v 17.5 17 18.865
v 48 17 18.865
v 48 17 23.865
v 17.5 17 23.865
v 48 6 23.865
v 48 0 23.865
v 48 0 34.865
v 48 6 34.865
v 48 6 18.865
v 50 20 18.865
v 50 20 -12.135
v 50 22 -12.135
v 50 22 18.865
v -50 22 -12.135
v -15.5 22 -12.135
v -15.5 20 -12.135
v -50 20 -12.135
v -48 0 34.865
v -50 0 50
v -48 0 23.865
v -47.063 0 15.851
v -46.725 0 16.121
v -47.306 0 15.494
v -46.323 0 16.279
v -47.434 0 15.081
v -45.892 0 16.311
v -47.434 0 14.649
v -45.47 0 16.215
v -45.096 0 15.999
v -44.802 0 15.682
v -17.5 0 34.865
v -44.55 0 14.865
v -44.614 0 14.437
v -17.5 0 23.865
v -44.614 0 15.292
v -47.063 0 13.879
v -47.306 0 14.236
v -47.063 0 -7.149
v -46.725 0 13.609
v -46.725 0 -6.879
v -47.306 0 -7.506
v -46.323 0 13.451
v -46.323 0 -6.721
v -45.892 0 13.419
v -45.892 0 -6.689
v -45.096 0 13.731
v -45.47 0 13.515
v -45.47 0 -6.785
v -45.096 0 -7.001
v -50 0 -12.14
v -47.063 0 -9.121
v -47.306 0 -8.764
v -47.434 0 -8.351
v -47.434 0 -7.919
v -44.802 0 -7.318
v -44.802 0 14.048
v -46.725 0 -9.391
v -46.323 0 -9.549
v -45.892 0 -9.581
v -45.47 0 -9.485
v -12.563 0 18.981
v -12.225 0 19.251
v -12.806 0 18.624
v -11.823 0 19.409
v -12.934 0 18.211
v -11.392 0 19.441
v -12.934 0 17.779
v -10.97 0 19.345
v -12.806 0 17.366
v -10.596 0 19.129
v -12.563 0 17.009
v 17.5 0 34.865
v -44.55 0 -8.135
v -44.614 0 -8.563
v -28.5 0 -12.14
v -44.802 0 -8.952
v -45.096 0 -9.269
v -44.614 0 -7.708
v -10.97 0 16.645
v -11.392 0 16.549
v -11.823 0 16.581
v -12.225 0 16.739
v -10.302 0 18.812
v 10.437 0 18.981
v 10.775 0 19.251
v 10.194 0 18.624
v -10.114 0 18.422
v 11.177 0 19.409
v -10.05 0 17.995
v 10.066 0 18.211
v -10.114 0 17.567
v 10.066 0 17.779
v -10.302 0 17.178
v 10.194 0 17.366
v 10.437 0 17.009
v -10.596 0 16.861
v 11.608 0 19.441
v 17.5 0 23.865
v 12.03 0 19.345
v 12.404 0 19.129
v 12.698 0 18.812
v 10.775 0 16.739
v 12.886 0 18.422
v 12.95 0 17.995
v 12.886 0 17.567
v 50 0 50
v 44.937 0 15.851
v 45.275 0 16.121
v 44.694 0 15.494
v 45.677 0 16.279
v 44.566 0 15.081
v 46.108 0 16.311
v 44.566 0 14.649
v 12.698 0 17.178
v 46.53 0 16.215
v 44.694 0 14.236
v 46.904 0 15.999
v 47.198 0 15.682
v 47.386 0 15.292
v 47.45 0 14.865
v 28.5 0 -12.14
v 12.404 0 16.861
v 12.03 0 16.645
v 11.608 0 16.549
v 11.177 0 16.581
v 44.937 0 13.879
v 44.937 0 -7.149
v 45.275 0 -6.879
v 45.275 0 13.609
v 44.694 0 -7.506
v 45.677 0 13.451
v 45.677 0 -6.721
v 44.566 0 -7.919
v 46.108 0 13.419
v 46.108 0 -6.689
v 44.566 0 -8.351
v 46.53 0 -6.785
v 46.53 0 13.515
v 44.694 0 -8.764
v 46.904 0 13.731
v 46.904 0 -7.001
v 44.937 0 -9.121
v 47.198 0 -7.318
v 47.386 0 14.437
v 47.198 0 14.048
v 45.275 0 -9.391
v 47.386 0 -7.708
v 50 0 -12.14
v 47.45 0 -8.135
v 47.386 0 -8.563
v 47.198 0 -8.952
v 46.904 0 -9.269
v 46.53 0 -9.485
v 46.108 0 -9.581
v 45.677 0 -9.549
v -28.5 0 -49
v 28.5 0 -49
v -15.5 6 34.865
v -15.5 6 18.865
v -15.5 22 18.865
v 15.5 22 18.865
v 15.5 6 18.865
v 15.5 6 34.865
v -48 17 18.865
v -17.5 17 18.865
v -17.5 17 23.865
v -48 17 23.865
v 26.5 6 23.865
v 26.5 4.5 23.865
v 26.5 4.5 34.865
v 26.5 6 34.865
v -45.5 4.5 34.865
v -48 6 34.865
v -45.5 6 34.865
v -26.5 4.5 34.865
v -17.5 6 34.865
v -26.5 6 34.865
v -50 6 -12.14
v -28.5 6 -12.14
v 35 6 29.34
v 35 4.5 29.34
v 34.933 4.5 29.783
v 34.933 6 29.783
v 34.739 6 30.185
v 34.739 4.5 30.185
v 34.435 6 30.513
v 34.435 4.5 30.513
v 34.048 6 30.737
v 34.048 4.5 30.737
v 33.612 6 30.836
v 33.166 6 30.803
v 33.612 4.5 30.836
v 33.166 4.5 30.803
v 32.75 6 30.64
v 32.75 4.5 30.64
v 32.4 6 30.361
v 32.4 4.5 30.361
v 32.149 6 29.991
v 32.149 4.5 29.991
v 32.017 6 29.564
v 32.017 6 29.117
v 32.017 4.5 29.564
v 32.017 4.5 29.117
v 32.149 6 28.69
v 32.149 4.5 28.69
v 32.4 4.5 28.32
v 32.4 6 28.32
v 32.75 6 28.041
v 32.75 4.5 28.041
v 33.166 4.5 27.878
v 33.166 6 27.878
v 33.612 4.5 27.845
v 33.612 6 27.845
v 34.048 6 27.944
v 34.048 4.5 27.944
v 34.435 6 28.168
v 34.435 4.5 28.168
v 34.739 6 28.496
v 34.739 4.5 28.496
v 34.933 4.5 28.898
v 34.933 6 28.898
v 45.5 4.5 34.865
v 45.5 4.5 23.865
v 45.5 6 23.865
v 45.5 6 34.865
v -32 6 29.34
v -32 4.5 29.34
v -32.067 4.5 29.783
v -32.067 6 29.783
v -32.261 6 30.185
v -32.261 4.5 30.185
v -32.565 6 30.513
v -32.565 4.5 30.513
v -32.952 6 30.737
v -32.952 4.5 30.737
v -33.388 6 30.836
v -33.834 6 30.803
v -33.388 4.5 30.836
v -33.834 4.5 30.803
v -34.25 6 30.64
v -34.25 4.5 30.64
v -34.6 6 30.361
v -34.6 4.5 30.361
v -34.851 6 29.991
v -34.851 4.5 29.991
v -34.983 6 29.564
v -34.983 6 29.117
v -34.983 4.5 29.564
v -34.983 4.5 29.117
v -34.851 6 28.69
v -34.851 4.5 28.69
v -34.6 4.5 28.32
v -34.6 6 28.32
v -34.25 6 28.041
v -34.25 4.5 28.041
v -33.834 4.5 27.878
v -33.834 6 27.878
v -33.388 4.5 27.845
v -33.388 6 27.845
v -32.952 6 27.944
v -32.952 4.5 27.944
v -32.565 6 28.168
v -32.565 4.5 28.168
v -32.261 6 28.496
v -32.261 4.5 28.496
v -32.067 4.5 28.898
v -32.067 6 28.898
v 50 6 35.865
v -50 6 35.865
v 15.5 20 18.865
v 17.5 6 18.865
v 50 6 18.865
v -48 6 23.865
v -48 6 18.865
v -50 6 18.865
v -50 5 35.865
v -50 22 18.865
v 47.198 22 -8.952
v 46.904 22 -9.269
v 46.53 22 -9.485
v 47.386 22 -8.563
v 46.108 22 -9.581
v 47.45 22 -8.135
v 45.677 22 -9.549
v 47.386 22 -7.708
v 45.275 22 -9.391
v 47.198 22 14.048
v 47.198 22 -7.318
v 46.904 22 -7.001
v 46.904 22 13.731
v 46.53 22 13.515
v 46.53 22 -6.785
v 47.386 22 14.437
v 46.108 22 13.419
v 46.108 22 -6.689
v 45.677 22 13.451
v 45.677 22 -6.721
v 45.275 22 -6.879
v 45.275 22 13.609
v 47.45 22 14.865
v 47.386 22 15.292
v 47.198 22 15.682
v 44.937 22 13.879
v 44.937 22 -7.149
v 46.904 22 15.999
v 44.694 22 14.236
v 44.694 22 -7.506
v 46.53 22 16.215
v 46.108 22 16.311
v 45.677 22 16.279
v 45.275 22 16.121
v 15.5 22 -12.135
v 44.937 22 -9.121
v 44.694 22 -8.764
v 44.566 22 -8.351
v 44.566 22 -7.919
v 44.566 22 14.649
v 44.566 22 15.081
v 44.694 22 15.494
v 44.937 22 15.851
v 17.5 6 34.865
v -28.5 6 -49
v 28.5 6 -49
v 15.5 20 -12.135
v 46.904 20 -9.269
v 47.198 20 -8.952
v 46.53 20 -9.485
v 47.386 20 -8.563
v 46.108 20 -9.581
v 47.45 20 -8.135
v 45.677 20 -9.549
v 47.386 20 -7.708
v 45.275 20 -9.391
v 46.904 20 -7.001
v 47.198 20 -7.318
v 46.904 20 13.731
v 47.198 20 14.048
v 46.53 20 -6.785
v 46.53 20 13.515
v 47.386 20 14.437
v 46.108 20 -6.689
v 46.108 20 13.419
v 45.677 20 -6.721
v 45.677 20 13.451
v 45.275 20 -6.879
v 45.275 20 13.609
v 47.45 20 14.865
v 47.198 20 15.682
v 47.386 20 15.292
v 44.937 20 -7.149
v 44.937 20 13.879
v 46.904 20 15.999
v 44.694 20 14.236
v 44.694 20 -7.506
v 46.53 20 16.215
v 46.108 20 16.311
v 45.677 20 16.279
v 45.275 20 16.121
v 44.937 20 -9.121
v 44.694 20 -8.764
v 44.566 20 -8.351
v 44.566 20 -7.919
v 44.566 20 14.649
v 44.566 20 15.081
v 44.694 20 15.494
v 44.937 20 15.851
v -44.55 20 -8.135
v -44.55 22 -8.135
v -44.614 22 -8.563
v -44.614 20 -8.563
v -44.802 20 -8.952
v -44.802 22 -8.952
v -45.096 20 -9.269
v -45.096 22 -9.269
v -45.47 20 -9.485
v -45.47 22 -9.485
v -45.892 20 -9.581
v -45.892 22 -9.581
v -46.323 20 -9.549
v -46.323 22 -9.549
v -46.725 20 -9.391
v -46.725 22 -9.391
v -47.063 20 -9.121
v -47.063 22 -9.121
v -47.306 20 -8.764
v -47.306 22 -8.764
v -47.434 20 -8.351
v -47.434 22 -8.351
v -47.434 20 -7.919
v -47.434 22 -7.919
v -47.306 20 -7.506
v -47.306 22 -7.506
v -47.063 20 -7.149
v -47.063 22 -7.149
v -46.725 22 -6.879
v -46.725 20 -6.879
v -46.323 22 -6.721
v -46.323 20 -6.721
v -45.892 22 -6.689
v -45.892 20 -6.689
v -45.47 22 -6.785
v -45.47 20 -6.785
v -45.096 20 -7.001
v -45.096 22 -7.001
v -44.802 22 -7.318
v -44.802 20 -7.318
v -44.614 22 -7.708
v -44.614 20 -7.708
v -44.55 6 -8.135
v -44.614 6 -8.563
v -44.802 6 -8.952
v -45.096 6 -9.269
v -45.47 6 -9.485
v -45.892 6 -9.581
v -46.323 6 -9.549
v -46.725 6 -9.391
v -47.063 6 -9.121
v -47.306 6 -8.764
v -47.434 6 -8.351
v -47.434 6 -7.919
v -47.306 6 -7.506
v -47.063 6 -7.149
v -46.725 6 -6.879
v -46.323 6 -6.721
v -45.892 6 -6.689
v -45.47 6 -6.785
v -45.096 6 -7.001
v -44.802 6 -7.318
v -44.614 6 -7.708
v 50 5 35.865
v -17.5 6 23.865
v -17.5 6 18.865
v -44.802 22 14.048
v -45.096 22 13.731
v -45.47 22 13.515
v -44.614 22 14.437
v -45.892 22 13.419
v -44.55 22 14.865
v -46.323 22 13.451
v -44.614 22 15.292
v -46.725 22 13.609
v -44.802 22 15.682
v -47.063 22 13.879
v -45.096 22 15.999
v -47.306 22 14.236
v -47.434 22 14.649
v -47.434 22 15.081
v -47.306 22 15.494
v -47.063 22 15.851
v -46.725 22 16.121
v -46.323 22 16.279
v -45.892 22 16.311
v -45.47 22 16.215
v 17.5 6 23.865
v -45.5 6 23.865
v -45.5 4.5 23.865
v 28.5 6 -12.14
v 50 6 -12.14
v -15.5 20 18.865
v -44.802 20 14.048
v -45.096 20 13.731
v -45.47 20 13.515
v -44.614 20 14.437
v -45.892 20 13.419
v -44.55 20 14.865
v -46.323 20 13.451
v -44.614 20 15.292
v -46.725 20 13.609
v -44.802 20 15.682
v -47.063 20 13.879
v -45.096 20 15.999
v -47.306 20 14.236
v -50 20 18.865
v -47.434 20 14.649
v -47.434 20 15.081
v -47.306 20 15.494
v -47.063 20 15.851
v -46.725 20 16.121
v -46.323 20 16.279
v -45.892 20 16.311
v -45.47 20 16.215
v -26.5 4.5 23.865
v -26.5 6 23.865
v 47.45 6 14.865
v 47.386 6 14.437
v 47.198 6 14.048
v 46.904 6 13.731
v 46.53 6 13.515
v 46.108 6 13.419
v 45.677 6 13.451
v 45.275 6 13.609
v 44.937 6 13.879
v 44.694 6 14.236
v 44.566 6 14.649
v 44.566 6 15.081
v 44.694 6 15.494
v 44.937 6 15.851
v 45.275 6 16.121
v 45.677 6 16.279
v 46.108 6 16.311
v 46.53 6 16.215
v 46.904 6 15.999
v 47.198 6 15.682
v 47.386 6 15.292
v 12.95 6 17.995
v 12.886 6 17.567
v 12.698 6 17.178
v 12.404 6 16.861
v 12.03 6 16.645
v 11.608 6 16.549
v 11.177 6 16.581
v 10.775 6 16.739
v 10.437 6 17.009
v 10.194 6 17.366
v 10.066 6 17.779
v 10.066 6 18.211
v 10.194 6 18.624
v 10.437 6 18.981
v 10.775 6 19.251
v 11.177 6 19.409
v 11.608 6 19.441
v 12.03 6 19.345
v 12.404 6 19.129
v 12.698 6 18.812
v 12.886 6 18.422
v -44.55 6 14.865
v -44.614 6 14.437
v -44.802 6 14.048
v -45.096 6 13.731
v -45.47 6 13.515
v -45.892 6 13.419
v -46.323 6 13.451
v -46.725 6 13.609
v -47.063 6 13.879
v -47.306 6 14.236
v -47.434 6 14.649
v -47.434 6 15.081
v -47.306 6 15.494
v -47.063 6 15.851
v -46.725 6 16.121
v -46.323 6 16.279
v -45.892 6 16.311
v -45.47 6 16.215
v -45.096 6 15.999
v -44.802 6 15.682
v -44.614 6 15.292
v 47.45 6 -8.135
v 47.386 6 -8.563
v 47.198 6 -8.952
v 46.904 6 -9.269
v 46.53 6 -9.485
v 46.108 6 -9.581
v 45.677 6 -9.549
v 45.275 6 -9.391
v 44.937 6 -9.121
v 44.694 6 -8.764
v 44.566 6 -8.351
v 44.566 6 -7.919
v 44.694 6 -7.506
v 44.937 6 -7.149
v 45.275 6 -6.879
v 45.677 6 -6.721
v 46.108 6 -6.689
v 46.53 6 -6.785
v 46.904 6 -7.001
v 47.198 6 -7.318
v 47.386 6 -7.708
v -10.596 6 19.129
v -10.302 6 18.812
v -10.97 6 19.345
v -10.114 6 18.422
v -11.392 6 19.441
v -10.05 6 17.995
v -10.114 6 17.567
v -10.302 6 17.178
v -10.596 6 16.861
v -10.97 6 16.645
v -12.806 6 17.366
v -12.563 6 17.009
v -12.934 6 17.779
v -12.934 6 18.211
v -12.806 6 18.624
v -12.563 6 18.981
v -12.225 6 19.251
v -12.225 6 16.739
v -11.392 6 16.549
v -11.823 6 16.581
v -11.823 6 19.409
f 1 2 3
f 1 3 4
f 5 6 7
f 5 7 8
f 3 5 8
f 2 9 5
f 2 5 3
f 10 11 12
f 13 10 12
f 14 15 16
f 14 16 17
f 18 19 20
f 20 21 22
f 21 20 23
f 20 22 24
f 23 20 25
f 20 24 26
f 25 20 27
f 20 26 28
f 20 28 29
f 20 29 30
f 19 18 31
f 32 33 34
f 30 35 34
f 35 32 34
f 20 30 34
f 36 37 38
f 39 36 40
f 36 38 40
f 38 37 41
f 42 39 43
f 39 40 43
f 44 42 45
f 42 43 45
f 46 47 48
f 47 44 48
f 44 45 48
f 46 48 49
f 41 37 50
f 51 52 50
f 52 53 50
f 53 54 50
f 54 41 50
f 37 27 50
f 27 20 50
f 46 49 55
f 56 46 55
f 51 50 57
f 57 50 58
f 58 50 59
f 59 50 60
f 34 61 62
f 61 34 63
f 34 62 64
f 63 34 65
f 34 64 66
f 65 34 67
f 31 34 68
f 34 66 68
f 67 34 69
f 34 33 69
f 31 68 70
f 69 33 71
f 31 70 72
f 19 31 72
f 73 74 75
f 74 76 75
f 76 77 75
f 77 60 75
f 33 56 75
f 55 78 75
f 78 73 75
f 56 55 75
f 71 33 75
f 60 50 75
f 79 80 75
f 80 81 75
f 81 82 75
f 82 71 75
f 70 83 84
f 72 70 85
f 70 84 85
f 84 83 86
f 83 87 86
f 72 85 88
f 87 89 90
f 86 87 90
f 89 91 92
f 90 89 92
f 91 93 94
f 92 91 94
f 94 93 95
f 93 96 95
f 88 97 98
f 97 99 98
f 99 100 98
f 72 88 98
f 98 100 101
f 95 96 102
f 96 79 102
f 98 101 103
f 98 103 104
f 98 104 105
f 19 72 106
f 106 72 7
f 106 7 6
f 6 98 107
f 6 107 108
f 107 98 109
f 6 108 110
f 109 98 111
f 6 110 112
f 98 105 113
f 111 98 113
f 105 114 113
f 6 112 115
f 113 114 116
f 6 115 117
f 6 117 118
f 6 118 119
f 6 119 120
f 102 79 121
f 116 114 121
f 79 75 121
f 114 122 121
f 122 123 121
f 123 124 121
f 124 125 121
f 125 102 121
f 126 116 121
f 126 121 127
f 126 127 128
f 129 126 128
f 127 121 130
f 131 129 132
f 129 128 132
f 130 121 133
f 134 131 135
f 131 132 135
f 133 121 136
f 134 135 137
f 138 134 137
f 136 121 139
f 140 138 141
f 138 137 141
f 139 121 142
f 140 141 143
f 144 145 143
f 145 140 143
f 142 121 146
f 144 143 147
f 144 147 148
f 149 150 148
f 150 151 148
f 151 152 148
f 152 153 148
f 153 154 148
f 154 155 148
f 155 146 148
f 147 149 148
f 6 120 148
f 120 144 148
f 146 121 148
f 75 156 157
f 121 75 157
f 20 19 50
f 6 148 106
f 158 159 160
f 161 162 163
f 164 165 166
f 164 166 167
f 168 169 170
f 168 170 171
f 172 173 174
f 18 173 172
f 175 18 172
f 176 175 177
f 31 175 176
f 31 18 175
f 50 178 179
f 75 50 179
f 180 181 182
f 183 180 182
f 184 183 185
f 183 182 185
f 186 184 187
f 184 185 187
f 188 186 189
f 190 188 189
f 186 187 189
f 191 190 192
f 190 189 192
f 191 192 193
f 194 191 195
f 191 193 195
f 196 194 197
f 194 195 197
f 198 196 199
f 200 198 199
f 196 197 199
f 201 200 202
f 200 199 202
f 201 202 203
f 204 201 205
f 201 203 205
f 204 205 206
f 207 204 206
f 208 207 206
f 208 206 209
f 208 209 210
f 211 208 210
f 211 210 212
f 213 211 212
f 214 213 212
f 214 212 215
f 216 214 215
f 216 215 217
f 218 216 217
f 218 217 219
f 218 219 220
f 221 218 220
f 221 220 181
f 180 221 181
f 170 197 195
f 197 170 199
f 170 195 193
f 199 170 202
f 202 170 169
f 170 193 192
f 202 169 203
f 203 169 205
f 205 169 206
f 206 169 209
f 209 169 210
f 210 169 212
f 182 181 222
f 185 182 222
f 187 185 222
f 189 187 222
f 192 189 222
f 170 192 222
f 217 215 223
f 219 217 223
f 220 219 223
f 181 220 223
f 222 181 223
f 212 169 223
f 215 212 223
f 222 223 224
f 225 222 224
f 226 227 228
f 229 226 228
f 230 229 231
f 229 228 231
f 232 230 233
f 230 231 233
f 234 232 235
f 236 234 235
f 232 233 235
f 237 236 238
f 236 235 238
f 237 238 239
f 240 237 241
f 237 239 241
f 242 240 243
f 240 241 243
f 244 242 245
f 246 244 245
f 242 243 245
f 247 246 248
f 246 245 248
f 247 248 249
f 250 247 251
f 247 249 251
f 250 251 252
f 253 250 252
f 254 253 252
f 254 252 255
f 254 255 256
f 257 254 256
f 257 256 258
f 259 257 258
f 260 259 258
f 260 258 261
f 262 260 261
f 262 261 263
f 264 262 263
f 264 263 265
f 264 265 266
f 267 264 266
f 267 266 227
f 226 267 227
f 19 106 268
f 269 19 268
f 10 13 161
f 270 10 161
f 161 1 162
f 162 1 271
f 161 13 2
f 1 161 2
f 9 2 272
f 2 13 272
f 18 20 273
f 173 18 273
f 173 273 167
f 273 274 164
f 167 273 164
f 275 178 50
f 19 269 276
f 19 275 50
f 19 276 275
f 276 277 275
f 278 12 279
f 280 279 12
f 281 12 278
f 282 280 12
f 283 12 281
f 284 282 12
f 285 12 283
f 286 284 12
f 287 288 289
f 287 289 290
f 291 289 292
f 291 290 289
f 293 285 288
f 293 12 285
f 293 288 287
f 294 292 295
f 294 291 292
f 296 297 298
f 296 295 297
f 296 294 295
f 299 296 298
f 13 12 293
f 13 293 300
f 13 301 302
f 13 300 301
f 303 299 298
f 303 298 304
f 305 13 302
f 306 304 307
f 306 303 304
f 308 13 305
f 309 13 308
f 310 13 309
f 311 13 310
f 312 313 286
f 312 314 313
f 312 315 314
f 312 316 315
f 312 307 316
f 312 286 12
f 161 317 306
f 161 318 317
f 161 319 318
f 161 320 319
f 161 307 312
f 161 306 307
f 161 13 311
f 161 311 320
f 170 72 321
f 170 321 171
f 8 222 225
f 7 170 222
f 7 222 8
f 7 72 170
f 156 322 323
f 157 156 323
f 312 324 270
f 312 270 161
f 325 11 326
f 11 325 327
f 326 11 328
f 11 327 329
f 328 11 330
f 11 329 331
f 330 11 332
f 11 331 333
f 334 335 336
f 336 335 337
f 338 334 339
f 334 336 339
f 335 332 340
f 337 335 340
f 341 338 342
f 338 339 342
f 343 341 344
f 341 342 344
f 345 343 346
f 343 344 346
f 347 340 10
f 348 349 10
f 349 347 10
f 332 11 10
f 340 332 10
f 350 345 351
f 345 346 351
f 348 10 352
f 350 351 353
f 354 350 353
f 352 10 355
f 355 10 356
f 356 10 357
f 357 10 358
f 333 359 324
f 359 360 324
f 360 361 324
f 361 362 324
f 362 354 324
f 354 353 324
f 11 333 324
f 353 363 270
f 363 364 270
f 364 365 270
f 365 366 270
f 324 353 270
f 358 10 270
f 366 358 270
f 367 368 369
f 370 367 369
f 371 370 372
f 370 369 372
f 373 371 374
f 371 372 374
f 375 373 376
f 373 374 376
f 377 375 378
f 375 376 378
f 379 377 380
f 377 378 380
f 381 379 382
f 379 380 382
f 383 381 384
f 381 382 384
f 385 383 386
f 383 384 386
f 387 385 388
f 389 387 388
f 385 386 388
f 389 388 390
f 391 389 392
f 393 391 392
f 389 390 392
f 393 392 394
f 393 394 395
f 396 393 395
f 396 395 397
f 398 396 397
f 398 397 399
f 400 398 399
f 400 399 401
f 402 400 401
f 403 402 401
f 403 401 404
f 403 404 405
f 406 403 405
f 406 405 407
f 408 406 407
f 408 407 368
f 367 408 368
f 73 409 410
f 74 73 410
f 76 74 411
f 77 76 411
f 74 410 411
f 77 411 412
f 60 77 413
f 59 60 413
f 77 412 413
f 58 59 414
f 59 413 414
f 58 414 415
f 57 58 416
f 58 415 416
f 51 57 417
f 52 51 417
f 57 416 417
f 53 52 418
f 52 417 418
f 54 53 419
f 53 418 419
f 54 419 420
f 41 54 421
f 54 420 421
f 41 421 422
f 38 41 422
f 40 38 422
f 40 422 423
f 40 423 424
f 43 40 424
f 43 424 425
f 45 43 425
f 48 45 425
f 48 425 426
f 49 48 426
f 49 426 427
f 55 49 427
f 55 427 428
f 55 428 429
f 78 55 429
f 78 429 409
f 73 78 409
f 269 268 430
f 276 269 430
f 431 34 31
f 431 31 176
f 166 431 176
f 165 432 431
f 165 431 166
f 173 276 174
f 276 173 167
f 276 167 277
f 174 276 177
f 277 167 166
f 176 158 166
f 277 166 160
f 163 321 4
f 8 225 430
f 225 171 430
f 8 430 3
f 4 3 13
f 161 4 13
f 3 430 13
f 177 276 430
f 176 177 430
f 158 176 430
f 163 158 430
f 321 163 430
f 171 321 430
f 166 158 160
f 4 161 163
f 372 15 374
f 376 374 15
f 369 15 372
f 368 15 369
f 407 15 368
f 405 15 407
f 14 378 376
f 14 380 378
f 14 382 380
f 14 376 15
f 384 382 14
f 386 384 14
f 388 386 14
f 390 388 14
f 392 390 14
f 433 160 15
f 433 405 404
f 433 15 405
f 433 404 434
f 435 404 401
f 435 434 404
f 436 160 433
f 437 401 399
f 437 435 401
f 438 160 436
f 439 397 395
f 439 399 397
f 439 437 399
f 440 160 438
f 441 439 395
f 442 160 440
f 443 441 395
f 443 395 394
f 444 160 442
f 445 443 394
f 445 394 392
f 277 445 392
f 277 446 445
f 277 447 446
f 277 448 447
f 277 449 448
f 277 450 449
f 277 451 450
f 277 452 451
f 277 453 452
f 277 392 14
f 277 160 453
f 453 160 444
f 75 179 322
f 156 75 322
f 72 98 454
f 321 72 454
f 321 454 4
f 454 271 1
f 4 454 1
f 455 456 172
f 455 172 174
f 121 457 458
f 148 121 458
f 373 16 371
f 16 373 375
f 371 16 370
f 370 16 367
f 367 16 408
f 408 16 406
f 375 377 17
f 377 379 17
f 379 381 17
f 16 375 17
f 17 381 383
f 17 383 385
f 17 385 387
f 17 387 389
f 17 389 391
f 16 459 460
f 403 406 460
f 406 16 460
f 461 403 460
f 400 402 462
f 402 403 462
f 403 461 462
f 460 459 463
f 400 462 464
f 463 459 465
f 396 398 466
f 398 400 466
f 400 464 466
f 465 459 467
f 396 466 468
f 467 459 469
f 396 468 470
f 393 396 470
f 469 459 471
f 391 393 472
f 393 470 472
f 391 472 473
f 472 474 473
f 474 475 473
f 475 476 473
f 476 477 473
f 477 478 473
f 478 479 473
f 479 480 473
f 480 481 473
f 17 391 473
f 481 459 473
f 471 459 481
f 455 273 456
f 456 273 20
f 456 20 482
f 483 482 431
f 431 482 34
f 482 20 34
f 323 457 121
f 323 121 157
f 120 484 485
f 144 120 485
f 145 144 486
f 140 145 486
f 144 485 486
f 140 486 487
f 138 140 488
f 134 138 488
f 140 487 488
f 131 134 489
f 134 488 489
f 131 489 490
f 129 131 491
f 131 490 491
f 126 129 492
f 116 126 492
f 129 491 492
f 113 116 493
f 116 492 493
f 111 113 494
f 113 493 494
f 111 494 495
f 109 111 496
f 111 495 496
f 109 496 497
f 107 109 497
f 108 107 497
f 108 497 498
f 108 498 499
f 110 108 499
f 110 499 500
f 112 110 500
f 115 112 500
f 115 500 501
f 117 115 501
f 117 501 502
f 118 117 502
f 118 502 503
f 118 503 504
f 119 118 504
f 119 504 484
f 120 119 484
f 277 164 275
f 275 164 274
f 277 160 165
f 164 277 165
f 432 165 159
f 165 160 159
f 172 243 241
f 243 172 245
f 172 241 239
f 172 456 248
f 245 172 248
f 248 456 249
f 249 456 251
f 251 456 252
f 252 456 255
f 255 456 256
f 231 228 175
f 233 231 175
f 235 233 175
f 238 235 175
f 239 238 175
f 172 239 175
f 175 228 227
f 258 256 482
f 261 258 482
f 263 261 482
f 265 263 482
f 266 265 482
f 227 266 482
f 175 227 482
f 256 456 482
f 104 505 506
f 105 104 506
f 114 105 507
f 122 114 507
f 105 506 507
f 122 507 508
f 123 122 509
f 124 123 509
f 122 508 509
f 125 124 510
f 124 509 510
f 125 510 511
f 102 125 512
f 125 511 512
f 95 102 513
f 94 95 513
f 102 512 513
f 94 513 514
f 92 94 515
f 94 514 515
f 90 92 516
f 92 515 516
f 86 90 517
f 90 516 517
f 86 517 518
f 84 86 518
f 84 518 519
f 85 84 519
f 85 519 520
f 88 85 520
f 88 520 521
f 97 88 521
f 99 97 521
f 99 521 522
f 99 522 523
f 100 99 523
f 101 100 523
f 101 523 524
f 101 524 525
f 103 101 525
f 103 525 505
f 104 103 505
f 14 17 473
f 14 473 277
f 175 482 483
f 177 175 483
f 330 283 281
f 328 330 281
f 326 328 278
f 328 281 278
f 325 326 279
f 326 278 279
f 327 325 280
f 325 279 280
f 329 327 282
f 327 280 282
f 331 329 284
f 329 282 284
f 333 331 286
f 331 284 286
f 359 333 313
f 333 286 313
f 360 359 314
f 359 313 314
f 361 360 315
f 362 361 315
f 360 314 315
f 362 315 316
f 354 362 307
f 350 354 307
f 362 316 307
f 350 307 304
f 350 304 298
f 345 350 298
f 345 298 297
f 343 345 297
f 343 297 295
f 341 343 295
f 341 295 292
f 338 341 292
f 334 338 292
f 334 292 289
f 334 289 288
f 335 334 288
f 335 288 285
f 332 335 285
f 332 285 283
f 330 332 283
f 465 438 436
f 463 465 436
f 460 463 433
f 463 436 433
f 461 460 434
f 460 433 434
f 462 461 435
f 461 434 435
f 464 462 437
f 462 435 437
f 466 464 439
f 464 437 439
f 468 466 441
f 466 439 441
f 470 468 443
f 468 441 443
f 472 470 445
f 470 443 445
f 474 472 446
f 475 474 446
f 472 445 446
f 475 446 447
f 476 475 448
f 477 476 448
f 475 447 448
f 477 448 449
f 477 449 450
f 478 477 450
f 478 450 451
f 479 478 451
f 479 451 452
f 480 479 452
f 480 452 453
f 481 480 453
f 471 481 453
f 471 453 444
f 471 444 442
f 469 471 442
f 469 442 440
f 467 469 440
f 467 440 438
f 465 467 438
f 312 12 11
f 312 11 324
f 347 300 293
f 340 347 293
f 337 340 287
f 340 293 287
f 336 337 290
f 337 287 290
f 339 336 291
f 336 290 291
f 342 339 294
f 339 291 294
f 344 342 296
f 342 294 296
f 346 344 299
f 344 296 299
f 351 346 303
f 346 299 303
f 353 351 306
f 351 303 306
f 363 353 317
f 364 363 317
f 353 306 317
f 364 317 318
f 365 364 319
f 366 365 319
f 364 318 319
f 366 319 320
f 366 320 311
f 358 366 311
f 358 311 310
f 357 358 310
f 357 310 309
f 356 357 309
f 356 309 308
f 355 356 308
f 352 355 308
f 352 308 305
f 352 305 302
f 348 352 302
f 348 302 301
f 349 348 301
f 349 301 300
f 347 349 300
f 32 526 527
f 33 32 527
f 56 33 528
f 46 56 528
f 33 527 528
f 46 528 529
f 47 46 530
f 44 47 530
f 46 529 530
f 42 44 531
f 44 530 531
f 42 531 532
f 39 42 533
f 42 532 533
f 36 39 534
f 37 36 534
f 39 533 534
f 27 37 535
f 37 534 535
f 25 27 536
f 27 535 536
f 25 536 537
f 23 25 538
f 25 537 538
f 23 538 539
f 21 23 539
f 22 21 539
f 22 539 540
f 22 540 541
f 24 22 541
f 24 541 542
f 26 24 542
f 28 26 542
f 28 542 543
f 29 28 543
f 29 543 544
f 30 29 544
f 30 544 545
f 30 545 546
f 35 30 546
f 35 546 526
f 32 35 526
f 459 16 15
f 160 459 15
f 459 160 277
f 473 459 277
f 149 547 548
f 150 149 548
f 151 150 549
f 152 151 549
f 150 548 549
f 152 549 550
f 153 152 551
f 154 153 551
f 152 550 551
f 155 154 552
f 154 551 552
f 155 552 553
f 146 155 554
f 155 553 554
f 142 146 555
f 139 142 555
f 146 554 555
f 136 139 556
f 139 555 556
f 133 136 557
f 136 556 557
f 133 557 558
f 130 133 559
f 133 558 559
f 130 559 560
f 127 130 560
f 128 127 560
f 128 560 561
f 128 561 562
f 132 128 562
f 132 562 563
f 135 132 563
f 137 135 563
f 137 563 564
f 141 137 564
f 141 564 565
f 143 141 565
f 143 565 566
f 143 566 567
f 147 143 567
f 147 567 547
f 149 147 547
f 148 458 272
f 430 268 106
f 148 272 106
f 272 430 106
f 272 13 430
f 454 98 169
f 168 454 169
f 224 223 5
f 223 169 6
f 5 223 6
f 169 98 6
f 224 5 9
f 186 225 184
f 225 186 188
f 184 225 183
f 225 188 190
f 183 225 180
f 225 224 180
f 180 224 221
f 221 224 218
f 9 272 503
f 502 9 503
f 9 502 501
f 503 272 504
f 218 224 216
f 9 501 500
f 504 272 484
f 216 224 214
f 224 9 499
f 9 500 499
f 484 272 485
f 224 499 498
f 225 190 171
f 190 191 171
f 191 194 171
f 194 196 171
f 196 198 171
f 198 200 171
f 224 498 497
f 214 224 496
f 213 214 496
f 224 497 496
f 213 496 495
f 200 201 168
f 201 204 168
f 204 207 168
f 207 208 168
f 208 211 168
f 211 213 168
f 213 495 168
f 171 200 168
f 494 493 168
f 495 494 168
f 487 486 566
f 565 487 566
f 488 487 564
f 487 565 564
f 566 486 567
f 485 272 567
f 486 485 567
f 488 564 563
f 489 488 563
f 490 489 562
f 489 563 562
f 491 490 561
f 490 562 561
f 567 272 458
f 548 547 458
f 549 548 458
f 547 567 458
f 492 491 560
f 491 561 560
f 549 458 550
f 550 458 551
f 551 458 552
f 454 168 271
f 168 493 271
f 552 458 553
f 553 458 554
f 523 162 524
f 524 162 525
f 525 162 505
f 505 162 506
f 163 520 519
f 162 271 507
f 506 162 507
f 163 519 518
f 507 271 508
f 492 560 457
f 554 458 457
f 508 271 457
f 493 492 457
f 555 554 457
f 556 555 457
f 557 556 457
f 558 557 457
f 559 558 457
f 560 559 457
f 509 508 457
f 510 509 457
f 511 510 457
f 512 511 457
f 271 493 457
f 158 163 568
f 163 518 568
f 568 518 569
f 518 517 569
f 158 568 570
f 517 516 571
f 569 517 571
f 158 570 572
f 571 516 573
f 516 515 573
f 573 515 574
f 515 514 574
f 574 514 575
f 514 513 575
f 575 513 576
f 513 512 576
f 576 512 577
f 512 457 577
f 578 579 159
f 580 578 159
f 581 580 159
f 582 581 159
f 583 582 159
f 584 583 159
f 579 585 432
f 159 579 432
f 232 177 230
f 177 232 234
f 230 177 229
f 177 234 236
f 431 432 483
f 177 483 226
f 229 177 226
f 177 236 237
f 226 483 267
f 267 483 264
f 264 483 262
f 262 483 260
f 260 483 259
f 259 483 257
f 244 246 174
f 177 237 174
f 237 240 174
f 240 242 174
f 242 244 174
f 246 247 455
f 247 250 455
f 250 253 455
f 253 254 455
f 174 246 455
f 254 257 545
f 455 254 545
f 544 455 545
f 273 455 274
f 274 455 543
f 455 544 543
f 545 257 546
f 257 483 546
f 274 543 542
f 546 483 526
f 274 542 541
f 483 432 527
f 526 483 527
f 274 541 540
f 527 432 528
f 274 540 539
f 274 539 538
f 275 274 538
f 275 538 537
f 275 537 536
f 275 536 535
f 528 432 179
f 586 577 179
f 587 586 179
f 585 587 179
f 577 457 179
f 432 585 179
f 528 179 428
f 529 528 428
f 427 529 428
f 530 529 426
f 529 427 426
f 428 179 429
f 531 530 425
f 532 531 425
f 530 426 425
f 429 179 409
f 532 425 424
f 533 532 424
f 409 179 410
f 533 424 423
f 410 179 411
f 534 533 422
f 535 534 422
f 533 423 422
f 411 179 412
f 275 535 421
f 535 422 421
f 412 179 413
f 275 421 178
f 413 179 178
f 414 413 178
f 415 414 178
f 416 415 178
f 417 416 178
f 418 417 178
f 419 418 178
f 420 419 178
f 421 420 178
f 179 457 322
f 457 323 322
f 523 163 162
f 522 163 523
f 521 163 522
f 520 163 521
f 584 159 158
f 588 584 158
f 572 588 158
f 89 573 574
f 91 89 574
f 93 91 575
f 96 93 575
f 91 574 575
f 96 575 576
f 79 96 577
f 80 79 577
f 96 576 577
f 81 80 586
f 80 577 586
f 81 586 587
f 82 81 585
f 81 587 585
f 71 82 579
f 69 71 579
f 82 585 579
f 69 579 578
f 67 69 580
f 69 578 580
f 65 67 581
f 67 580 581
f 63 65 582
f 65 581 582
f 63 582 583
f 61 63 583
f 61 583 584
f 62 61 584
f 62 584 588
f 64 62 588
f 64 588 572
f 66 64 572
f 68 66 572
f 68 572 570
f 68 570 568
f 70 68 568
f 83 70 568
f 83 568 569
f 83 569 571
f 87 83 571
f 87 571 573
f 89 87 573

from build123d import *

# Parameters (mm, degrees)
SKETCH1_W             = 100
SKETCH1_H             = 100
BOSS_EXTRUDE1_DEPTH   = 6
CUT_EXTRUDE1_DEPTH    = 101
CUT_EXTRUDE3_DEPTH    = 101
SKETCH4_W             = 100
SKETCH4_H             = 1
CUT_EXTRUDE4_DEPTH    = 7
BOSS_EXTRUDE2_DEPTH   = 100
SKETCH8_W             = 34.5
SKETCH8_H             = 2
BOSS_EXTRUDE3_DEPTH   = 31
BOSS_EXTRUDE3_2_DEPTH = 31
SKETCH15_W            = 21.5
SKETCH15_H            = 36.86
CUT_EXTRUDE7_DEPTH    = 7
SKETCH18_W            = 31
SKETCH18_H            = 16
CUT_EXTRUDE8_DEPTH    = 48
SKETCH19_R            = 1.45
CUT_EXTRUDE9_DEPTH    = 23
SKETCH20_R            = 1.45
CUT_EXTRUDE10_DEPTH   = 7
SKETCH23_W            = 30.5
SKETCH23_H            = 11
CUT_EXTRUDE11_DEPTH   = 32.135114195
SKETCH27_W            = 30.5
SKETCH27_H            = 11
CUT_EXTRUDE14_DEPTH   = 10
SKETCH32_W            = 19
SKETCH32_H            = 1.5
BOSS_EXTRUDE6_DEPTH   = 11
SKETCH33_R            = 1.5
CUT_EXTRUDE15_DEPTH   = 6


with BuildPart() as part:
    # Sketch1 → Boss-Extrude1 (new body)
    with BuildSketch(Plane(origin=(0, 0, 0), x_dir=(1, 0, 0), z_dir=(0, 1, 0))):
        Rectangle(SKETCH1_W, SKETCH1_H)
    extrude(amount=BOSS_EXTRUDE1_DEPTH)

    # Sketch2 → Cut-Extrude1 (cut, through all)
    with BuildSketch(Plane(origin=(50, 0, 0), x_dir=(0, 0, -1), z_dir=(1, 0, 0))):
        Polygon((-50, 0), (-35.864885805, 6), (-50, 6), align=None)
    extrude(amount=-CUT_EXTRUDE1_DEPTH, mode=Mode.SUBTRACT)

    # Sketch3 → Cut-Extrude3 (cut, through all)
    with BuildSketch(Plane(origin=(50, 0, 0), x_dir=(0, 0, -1), z_dir=(1, 0, 0))):
        Polygon((-35.864885805, 6), (-35.864885805, 5), (-34.864885805, 6), align=None)
    extrude(amount=-CUT_EXTRUDE3_DEPTH, mode=Mode.SUBTRACT)

    # Sketch4 → Cut-Extrude4 (cut, through all)
    with BuildSketch(Plane(origin=(0, 6, 0), x_dir=(1, 0, 0), z_dir=(0, 1, 0))):
        with Locations((0, 49.5)):
            Rectangle(SKETCH4_W, SKETCH4_H)
    extrude(amount=-CUT_EXTRUDE4_DEPTH, mode=Mode.SUBTRACT)

    # Sketch6 → Boss-Extrude2 (add, through all)
    with BuildSketch(Plane(origin=(50, 0, 0), x_dir=(0, 0, -1), z_dir=(1, 0, 0))):
        Polygon((-34.864885805, 6), (-18.864885805, 22), (-18.864885805, 6), align=None)
    extrude(amount=-BOSS_EXTRUDE2_DEPTH)

    # Sketch15 → Cut-Extrude7 (cut, through all)
    with BuildSketch(Plane(origin=(0, 6, 0), x_dir=(1, 0, 0), z_dir=(0, 1, 0))):
        with Locations((-39.25, 30.57)):
            Rectangle(SKETCH15_W, SKETCH15_H)
        with Locations((39.25, 30.57)):
            Rectangle(SKETCH15_W, SKETCH15_H)
    extrude(amount=-CUT_EXTRUDE7_DEPTH, mode=Mode.SUBTRACT)

    # Sketch18 → Cut-Extrude8 (cut)
    with BuildSketch(Plane(origin=(0, 0, 18.864885805), x_dir=(-1, 0, 0), z_dir=(0, 0, -1))):
        with Locations((0, 14)):
            Rectangle(SKETCH18_W, SKETCH18_H)
    extrude(amount=-CUT_EXTRUDE8_DEPTH, mode=Mode.SUBTRACT)


with BuildPart() as body_2:
    # Sketch8 → Boss-Extrude3 (new body)
    with BuildSketch(Plane(origin=(0, 0, 18.864885805), x_dir=(-1, 0, 0), z_dir=(0, 0, -1))):
        with Locations((-32.75, 21)):
            Rectangle(SKETCH8_W, SKETCH8_H)
    extrude(amount=BOSS_EXTRUDE3_DEPTH)


with BuildPart() as body_3:
    # Sketch8 → Boss-Extrude3 2 (new body)
    with BuildSketch(Plane(origin=(0, 0, 18.864885805), x_dir=(-1, 0, 0), z_dir=(0, 0, -1))):
        with Locations((32.75, 21)):
            Rectangle(SKETCH8_W, SKETCH8_H)
    extrude(amount=BOSS_EXTRUDE3_2_DEPTH)


with BuildPart() as cut_extrude9_tool:
    # Sketch19 → Cut-Extrude9 (new body, through all)
    with BuildSketch(Plane(origin=(0, 22, 0), x_dir=(1, 0, 0), z_dir=(0, 1, 0))):
        with Locations((-46, -14.864885805)):
            Circle(SKETCH19_R)
        with Locations((-46, 8.135114195)):
            Circle(SKETCH19_R)
        with Locations((46, 8.135114195)):
            Circle(SKETCH19_R)
        with Locations((46, -14.864885805)):
            Circle(SKETCH19_R)
    extrude(amount=-CUT_EXTRUDE9_DEPTH)


with BuildPart() as part_1:
    add(part.part)

    # Cut-Extrude9: cut by cut_extrude9_tool
    add(cut_extrude9_tool.part, mode=Mode.SUBTRACT)

    # Sketch20 → Cut-Extrude10 (cut, through all)
    with BuildSketch(Plane(origin=(0, 6, 0), x_dir=(1, 0, 0), z_dir=(0, 1, 0))):
        with Locations((-11.5, -17.994885805)):
            Circle(SKETCH20_R)
        with Locations((11.5, -17.994885805)):
            Circle(SKETCH20_R)
    extrude(amount=-CUT_EXTRUDE10_DEPTH, mode=Mode.SUBTRACT)

    # Sketch23 → Cut-Extrude11 (cut, through all)
    with BuildSketch(Plane(origin=(0, 0, 18.864885805), x_dir=(-1, 0, 0), z_dir=(0, 0, -1))):
        with Locations((-32.75, 11.5)):
            Rectangle(SKETCH23_W, SKETCH23_H)
        with Locations((32.75, 11.5)):
            Rectangle(SKETCH23_W, SKETCH23_H)
    extrude(amount=-CUT_EXTRUDE11_DEPTH, mode=Mode.SUBTRACT)

    # Sketch27 → Cut-Extrude14 (cut)
    with BuildSketch(Plane.XZ):
        with Locations((-32.75, 29.364885805)):
            Rectangle(SKETCH27_W, SKETCH27_H)
        with Locations((32.75, 29.364885805)):
            Rectangle(SKETCH27_W, SKETCH27_H)
    extrude(amount=-CUT_EXTRUDE14_DEPTH, mode=Mode.SUBTRACT)

    # Sketch32 → Boss-Extrude6 (add)
    with BuildSketch(Plane.XY.offset(23.864885805)):
        with Locations((-36, 5.25)):
            Rectangle(SKETCH32_W, SKETCH32_H)
        with Locations((36, 5.25)):
            Rectangle(SKETCH32_W, SKETCH32_H)
    extrude(amount=BOSS_EXTRUDE6_DEPTH)

    # Sketch33 → Cut-Extrude15 (cut)
    with BuildSketch(Plane.XZ):
        with Locations((-33.5, 29.340498756)):
            Circle(SKETCH33_R)
        with Locations((33.5, 29.340498756)):
            Circle(SKETCH33_R)
    extrude(amount=-CUT_EXTRUDE15_DEPTH, mode=Mode.SUBTRACT)


with BuildPart() as body_2_1:
    add(body_2.part)

    # Cut-Extrude9: cut by cut_extrude9_tool
    add(cut_extrude9_tool.part, mode=Mode.SUBTRACT)


with BuildPart() as body_3_1:
    add(body_3.part)

    # Cut-Extrude9: cut by cut_extrude9_tool
    add(cut_extrude9_tool.part, mode=Mode.SUBTRACT)


solid = Compound([part_1.part, body_2_1.part, body_3_1.part])
